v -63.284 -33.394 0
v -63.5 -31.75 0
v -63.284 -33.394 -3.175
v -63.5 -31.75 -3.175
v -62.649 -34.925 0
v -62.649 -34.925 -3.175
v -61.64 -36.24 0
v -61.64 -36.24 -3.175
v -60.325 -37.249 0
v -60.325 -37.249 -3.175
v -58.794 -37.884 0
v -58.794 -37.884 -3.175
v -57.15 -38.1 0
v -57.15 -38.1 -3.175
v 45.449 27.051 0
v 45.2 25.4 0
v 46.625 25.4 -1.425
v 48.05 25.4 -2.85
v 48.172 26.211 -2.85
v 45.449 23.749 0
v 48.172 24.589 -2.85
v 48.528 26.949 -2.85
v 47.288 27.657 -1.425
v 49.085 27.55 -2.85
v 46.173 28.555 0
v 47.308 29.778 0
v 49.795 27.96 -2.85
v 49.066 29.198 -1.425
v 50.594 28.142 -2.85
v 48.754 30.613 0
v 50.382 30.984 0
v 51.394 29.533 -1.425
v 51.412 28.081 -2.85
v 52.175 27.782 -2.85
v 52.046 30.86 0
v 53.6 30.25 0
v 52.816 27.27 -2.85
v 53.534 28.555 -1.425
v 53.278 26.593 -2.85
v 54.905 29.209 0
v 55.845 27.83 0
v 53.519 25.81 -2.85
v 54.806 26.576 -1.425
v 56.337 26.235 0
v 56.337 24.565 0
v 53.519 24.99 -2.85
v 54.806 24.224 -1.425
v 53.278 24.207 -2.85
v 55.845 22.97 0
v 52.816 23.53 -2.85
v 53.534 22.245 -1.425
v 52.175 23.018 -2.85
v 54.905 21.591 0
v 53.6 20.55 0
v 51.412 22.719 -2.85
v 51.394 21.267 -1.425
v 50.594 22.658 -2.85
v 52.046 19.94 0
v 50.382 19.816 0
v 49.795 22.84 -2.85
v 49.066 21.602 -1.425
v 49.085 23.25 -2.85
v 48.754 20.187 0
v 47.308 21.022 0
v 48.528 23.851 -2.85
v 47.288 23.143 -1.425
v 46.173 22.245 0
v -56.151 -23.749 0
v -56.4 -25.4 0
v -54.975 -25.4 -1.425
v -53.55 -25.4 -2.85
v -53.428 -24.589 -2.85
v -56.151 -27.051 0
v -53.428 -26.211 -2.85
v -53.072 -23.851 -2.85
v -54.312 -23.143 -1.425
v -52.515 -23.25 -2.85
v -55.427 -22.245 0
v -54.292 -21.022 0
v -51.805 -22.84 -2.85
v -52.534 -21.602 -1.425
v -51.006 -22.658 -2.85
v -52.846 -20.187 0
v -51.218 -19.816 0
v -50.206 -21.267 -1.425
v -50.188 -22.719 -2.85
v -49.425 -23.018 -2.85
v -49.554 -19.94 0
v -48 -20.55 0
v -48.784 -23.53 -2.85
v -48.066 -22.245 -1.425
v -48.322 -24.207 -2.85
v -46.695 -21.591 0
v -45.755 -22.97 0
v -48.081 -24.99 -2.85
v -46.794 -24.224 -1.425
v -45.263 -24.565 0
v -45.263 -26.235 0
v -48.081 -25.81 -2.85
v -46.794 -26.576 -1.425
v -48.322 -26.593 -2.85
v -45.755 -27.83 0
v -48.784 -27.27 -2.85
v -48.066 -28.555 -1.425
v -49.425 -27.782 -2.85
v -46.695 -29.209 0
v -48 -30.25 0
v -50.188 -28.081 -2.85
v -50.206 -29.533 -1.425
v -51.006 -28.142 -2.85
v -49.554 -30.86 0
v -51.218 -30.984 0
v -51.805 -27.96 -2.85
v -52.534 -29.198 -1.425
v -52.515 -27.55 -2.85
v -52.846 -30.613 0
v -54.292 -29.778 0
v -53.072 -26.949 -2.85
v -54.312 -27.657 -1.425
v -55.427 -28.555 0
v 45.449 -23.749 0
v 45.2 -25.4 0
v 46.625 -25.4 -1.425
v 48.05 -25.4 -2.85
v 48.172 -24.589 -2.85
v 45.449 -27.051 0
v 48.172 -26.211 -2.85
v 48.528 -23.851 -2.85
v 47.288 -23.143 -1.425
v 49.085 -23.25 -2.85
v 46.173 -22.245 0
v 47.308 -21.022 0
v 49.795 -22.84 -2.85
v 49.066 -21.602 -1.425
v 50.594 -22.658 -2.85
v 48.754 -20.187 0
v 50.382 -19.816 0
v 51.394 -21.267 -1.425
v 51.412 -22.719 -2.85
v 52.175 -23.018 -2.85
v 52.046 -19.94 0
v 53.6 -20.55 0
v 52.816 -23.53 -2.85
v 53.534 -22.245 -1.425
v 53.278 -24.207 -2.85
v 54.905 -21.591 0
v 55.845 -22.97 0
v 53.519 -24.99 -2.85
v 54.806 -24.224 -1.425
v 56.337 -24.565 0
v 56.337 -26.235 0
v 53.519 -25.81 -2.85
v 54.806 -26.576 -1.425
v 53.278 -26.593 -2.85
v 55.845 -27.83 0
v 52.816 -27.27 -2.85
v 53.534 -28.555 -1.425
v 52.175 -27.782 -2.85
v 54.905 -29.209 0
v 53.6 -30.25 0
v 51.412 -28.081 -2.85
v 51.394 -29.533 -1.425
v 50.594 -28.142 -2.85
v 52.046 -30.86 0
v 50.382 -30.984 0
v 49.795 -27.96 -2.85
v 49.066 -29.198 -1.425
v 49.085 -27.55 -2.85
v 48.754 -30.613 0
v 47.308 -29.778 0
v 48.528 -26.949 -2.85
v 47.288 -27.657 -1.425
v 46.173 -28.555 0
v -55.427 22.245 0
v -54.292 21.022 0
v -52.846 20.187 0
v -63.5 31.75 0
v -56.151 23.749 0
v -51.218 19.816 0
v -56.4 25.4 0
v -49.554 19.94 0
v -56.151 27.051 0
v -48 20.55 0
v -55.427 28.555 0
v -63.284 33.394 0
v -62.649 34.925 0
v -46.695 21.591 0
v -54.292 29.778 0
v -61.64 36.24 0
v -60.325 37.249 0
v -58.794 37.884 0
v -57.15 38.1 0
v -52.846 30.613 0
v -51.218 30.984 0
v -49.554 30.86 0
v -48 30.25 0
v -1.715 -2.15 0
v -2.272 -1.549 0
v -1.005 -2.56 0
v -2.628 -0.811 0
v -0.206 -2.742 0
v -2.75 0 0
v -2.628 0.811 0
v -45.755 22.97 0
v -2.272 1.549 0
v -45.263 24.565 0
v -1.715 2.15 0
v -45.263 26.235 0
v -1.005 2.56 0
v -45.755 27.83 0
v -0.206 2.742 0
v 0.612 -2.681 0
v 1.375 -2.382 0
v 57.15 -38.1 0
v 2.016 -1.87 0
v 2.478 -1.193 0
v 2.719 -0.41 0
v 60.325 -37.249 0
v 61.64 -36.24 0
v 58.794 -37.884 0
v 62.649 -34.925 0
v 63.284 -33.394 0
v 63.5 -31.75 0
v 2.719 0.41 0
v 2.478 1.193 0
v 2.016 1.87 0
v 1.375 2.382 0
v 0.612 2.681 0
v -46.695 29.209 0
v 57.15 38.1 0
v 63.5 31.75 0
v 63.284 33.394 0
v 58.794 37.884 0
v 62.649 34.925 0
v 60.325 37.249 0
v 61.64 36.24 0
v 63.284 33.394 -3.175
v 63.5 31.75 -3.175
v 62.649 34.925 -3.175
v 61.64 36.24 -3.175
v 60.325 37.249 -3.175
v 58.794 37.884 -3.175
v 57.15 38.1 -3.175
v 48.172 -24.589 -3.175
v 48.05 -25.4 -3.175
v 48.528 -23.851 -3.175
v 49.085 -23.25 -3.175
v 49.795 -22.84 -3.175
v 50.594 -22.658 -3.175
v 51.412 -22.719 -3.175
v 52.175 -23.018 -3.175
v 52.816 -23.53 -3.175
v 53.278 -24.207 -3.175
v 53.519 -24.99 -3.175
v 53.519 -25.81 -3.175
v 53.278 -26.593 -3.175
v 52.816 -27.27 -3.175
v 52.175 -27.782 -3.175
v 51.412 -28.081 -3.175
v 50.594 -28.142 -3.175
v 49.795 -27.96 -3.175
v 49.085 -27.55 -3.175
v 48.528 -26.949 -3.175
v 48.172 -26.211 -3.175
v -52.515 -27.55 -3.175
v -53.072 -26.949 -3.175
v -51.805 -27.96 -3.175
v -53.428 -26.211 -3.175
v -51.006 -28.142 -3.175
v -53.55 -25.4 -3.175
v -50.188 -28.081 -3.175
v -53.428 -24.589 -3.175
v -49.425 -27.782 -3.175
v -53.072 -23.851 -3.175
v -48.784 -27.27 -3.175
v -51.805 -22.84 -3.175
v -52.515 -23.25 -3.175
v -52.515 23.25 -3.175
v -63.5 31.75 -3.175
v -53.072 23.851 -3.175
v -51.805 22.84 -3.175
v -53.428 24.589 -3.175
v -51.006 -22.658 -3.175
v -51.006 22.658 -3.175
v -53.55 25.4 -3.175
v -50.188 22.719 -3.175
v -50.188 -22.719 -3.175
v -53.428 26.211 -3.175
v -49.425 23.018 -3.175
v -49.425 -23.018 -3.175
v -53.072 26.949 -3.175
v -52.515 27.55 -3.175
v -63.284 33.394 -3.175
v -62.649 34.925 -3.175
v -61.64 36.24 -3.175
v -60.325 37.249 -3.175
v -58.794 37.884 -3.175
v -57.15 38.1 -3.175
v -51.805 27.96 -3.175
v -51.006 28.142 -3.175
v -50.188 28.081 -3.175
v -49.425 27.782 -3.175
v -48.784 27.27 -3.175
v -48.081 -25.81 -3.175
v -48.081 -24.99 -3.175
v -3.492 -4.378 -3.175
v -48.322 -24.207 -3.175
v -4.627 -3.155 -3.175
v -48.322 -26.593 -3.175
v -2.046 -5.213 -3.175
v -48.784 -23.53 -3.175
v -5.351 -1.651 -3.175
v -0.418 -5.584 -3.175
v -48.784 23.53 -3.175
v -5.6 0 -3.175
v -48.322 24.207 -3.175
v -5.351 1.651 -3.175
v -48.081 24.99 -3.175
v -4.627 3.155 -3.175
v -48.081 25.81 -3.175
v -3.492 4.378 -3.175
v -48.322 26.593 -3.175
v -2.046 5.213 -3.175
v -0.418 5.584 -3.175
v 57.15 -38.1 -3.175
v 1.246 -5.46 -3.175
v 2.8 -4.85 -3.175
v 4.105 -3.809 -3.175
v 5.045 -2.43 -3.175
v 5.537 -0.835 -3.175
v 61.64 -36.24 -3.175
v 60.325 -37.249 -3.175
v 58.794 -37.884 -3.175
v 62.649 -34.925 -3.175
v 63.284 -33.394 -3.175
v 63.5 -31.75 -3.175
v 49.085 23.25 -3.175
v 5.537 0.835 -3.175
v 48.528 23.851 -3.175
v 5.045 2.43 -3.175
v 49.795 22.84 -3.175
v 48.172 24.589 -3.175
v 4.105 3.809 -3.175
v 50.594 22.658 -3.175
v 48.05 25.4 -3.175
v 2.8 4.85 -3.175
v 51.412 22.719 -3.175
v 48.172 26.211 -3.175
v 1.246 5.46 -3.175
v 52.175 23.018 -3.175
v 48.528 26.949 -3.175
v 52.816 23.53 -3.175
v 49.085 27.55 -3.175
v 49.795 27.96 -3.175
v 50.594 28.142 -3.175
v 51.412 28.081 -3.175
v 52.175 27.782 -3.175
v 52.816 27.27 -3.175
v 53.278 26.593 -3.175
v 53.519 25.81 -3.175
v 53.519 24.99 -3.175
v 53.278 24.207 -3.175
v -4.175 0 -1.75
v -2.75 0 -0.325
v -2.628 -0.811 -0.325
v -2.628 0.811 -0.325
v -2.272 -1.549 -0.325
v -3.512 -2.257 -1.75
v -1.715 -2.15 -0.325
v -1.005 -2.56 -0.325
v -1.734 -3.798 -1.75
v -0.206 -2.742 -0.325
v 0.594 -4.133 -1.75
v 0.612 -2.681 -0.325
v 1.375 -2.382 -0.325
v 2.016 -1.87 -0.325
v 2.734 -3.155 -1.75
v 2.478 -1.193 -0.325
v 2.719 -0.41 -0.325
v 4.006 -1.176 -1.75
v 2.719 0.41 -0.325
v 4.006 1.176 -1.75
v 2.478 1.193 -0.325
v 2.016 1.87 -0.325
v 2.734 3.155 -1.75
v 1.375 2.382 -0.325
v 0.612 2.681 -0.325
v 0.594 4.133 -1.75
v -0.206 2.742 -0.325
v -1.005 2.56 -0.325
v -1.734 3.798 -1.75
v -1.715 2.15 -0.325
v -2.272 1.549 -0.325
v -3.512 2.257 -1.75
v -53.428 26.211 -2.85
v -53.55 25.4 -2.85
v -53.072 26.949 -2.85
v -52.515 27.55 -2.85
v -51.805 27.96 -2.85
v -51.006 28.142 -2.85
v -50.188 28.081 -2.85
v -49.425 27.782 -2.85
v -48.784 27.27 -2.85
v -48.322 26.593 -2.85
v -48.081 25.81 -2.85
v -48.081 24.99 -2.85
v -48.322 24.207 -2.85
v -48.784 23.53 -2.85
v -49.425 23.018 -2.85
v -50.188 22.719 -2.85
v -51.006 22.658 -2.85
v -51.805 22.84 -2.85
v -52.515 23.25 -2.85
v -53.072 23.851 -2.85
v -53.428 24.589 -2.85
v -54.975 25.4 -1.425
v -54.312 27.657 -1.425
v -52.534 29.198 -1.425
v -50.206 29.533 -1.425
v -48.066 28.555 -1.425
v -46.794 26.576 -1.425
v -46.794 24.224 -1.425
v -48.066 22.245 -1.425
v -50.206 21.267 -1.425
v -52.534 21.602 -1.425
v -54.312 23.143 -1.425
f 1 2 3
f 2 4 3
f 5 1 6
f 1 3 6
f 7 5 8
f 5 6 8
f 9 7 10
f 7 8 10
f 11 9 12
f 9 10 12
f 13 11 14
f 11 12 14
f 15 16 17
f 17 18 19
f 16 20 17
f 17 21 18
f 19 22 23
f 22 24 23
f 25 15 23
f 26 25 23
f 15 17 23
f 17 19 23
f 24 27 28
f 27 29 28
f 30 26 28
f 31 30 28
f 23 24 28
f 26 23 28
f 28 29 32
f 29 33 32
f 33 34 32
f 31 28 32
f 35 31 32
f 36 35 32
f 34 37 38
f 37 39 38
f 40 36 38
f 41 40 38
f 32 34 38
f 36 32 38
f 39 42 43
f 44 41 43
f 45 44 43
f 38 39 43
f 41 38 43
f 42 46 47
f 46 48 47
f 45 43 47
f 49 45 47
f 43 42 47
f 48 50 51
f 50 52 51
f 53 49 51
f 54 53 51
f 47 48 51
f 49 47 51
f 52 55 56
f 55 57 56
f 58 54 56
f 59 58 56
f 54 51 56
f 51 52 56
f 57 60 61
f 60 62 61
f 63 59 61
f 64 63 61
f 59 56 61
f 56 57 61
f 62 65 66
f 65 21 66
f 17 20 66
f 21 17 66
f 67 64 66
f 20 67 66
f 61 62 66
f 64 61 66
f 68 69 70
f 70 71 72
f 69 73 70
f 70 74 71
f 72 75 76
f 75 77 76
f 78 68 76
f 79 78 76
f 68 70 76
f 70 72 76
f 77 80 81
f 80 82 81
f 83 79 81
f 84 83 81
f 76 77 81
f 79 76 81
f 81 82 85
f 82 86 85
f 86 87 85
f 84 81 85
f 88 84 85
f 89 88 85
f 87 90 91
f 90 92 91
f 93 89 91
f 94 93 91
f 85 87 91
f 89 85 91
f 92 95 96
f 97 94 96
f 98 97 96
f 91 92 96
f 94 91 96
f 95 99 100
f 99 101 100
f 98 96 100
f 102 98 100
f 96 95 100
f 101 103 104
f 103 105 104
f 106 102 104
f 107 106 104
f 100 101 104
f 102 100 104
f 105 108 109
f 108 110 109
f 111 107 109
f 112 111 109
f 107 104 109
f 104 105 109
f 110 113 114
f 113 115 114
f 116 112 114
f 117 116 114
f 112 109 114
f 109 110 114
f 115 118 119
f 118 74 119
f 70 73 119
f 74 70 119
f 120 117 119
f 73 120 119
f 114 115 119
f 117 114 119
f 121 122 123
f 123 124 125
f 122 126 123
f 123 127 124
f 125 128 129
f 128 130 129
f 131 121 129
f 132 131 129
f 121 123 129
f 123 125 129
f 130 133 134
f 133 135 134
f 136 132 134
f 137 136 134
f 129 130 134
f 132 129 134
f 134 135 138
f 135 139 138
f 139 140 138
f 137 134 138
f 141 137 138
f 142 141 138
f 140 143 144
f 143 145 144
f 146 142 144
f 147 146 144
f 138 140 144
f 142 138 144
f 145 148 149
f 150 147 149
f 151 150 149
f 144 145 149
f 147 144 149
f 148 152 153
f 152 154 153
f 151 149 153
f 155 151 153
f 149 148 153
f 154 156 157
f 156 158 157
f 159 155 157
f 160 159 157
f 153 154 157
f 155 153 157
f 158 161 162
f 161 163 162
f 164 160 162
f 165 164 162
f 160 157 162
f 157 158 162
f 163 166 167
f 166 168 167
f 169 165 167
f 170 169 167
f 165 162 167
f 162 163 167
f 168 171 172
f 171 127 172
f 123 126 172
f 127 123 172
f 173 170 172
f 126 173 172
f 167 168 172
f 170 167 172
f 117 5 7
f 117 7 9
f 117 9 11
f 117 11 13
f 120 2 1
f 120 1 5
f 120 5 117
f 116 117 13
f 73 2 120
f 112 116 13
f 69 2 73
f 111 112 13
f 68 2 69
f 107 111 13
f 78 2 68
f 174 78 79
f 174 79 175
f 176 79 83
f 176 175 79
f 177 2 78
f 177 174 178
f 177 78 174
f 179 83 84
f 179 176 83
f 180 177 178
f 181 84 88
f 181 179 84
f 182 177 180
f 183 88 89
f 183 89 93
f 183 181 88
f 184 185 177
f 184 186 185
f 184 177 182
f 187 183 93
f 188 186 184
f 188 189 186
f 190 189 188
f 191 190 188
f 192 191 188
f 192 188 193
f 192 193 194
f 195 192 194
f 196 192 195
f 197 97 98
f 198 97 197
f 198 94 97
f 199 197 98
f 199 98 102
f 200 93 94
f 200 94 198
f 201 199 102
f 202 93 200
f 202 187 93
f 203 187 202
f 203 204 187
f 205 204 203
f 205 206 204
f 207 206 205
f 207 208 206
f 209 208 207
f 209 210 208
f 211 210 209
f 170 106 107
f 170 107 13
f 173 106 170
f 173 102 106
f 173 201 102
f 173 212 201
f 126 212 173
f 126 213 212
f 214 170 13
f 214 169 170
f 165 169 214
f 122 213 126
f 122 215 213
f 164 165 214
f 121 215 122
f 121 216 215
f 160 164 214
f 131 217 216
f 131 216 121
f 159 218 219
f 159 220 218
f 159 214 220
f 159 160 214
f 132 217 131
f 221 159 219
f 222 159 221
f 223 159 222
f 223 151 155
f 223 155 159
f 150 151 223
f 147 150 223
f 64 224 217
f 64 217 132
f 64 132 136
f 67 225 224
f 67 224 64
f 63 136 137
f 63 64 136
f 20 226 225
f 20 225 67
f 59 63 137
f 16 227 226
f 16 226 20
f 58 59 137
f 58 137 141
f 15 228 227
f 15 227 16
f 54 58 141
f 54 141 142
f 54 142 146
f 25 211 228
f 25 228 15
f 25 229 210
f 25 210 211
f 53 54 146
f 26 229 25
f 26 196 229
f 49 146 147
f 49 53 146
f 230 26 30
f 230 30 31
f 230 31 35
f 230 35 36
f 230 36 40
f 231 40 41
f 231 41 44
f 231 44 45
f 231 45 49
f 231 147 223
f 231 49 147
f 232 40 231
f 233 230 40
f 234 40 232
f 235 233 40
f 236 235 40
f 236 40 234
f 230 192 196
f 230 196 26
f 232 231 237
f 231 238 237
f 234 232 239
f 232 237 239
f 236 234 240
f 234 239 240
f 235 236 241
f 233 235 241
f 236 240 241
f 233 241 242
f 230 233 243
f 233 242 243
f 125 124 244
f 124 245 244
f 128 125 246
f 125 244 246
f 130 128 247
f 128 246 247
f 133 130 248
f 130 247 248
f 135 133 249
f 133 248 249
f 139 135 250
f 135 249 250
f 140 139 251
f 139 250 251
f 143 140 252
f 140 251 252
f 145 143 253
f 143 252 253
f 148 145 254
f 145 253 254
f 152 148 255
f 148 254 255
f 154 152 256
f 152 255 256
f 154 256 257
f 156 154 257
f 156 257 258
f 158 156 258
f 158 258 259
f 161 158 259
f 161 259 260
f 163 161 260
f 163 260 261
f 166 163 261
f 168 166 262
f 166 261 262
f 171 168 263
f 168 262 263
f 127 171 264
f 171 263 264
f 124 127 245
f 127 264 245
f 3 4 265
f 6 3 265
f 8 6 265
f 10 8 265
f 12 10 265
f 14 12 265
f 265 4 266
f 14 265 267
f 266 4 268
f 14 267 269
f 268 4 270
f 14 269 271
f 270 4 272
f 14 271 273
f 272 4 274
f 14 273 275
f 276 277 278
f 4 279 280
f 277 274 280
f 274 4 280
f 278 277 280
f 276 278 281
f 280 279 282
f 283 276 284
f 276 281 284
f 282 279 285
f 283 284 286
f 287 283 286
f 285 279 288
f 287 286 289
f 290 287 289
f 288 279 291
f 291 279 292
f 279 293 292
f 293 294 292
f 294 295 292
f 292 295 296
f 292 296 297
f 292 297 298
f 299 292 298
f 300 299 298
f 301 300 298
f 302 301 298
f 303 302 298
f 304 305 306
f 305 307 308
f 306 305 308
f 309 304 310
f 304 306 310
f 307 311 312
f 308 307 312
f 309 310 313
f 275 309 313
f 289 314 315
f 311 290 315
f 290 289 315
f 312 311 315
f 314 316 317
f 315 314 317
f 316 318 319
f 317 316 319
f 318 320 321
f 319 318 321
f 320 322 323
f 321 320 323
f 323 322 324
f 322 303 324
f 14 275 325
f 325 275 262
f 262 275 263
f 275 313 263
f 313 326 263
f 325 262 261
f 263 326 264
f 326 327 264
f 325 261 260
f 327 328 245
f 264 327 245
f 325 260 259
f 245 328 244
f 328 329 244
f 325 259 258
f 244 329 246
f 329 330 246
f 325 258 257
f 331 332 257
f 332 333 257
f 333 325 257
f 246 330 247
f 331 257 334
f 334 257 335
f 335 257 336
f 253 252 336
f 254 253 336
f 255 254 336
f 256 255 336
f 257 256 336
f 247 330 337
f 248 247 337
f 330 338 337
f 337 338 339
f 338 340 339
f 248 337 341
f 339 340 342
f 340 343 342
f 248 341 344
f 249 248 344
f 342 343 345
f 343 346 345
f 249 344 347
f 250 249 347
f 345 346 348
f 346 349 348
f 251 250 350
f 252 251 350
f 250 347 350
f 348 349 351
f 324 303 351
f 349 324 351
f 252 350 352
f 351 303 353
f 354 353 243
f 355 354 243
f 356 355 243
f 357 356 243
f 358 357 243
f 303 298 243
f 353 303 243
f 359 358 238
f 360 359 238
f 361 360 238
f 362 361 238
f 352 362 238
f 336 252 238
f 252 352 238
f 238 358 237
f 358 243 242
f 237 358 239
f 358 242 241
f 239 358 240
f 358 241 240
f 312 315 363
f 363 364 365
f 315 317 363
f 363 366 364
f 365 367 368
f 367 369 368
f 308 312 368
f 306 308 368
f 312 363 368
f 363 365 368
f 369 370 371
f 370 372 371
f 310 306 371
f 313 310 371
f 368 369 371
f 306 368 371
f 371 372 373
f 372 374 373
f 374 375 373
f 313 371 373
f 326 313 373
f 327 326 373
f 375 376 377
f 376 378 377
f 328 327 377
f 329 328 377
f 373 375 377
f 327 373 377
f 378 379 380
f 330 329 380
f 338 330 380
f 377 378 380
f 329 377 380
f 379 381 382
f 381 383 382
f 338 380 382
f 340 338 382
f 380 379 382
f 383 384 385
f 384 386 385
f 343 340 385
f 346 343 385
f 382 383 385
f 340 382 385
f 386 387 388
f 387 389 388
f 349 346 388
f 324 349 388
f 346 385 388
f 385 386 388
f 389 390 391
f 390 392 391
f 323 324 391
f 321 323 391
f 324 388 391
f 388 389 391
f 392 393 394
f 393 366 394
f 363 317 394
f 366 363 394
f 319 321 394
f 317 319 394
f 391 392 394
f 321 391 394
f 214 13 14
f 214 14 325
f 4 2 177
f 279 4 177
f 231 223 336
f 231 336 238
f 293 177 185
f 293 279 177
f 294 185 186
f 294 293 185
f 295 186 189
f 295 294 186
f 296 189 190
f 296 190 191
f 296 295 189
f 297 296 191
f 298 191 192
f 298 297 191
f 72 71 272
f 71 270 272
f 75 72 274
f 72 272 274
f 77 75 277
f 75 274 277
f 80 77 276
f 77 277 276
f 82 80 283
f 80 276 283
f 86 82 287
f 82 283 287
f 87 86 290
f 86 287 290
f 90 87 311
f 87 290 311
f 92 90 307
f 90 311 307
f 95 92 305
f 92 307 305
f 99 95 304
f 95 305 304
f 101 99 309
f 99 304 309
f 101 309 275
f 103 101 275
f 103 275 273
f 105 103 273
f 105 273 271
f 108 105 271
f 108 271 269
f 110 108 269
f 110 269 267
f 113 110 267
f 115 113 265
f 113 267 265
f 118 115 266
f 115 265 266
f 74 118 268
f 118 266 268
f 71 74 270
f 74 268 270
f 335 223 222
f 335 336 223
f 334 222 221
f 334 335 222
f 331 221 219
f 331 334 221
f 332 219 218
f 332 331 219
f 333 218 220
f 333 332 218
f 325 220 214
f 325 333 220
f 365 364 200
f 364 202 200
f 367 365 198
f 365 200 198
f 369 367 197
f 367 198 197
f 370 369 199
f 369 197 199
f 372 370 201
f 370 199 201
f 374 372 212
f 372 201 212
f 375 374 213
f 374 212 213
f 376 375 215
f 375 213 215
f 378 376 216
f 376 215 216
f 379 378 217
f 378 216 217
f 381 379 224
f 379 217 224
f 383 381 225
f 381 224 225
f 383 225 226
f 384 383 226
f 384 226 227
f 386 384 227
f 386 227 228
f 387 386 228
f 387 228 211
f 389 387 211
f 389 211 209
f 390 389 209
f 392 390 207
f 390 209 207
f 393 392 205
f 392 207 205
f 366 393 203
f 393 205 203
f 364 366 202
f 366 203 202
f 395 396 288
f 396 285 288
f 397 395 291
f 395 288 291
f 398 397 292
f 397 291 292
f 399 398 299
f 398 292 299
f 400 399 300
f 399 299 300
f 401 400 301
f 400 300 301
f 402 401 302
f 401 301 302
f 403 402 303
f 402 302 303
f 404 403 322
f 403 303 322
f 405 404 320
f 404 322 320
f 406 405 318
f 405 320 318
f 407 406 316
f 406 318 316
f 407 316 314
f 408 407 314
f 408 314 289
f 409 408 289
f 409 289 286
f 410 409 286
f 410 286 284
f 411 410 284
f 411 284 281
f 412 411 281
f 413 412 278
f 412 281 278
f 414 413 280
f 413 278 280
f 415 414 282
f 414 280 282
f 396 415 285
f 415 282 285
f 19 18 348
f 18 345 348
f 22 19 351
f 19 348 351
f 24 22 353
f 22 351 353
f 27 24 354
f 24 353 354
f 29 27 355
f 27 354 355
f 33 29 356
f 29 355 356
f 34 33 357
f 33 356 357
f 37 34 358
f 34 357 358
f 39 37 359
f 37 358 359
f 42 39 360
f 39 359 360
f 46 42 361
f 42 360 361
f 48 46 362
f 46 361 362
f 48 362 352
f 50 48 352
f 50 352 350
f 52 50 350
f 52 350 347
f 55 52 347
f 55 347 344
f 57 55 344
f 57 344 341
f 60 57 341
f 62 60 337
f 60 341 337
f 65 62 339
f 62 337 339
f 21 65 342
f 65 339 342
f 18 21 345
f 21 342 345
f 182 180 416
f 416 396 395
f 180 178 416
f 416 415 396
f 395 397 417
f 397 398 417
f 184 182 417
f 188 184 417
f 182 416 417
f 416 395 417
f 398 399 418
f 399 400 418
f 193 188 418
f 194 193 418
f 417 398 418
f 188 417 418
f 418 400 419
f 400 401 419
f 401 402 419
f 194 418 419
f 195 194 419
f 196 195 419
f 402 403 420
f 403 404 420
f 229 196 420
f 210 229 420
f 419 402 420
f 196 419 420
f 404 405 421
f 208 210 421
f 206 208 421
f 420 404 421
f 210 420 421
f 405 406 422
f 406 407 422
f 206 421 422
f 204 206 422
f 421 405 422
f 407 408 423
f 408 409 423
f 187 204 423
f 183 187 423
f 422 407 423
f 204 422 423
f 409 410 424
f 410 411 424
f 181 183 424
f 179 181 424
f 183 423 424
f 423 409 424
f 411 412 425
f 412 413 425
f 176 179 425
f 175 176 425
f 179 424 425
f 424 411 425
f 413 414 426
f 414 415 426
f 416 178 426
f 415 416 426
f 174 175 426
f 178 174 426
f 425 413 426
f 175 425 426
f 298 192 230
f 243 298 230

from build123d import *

# Parameters (mm, degrees)
F0_W           = 127
F0_H           = 76.2
F1_DEPTH       = 3.175
F3_D           = 5.5
F3_CSINK_D     = 11.2
F3_CSINK_ANGLE = 90
F5_D           = 5.5
F5_CSINK_D     = 11.2
F5_CSINK_ANGLE = 90
F6_R           = 6.35


with BuildPart() as f1:
    # F0 (on Top) → F1 (new body)
    with BuildSketch(Plane.XY):
        Rectangle(F0_W, F0_H)
    extrude(amount=-F1_DEPTH)

    # F3 (through all)
    with Locations(Plane.XY):
        with Locations((-50.8, -25.4), (-50.8, 25.4), (50.8, 25.4), (50.8, -25.4)):
            CounterSinkHole(F3_D / 2, F3_CSINK_D / 2, counter_sink_angle=F3_CSINK_ANGLE)

    # F5 (through all)
    with Locations(Plane(origin=(0, 0, -3.175), x_dir=(1, 0, 0), z_dir=(0, 0, -1))):
        with Locations((0, 0)):
            CounterSinkHole(F5_D / 2, F5_CSINK_D / 2, counter_sink_angle=F5_CSINK_ANGLE)

    # F6
    f6_edges = [f1.edges().sort_by_distance(p)[0] for p in [
        (63.5, -38.1, -1.5875),
        (63.5, 38.1, -1.5875),
        (-63.5, -38.1, -1.5875),
        (-63.5, 38.1, -1.5875),
    ]]
    fillet(f6_edges, radius=F6_R)


solid = f1.part
